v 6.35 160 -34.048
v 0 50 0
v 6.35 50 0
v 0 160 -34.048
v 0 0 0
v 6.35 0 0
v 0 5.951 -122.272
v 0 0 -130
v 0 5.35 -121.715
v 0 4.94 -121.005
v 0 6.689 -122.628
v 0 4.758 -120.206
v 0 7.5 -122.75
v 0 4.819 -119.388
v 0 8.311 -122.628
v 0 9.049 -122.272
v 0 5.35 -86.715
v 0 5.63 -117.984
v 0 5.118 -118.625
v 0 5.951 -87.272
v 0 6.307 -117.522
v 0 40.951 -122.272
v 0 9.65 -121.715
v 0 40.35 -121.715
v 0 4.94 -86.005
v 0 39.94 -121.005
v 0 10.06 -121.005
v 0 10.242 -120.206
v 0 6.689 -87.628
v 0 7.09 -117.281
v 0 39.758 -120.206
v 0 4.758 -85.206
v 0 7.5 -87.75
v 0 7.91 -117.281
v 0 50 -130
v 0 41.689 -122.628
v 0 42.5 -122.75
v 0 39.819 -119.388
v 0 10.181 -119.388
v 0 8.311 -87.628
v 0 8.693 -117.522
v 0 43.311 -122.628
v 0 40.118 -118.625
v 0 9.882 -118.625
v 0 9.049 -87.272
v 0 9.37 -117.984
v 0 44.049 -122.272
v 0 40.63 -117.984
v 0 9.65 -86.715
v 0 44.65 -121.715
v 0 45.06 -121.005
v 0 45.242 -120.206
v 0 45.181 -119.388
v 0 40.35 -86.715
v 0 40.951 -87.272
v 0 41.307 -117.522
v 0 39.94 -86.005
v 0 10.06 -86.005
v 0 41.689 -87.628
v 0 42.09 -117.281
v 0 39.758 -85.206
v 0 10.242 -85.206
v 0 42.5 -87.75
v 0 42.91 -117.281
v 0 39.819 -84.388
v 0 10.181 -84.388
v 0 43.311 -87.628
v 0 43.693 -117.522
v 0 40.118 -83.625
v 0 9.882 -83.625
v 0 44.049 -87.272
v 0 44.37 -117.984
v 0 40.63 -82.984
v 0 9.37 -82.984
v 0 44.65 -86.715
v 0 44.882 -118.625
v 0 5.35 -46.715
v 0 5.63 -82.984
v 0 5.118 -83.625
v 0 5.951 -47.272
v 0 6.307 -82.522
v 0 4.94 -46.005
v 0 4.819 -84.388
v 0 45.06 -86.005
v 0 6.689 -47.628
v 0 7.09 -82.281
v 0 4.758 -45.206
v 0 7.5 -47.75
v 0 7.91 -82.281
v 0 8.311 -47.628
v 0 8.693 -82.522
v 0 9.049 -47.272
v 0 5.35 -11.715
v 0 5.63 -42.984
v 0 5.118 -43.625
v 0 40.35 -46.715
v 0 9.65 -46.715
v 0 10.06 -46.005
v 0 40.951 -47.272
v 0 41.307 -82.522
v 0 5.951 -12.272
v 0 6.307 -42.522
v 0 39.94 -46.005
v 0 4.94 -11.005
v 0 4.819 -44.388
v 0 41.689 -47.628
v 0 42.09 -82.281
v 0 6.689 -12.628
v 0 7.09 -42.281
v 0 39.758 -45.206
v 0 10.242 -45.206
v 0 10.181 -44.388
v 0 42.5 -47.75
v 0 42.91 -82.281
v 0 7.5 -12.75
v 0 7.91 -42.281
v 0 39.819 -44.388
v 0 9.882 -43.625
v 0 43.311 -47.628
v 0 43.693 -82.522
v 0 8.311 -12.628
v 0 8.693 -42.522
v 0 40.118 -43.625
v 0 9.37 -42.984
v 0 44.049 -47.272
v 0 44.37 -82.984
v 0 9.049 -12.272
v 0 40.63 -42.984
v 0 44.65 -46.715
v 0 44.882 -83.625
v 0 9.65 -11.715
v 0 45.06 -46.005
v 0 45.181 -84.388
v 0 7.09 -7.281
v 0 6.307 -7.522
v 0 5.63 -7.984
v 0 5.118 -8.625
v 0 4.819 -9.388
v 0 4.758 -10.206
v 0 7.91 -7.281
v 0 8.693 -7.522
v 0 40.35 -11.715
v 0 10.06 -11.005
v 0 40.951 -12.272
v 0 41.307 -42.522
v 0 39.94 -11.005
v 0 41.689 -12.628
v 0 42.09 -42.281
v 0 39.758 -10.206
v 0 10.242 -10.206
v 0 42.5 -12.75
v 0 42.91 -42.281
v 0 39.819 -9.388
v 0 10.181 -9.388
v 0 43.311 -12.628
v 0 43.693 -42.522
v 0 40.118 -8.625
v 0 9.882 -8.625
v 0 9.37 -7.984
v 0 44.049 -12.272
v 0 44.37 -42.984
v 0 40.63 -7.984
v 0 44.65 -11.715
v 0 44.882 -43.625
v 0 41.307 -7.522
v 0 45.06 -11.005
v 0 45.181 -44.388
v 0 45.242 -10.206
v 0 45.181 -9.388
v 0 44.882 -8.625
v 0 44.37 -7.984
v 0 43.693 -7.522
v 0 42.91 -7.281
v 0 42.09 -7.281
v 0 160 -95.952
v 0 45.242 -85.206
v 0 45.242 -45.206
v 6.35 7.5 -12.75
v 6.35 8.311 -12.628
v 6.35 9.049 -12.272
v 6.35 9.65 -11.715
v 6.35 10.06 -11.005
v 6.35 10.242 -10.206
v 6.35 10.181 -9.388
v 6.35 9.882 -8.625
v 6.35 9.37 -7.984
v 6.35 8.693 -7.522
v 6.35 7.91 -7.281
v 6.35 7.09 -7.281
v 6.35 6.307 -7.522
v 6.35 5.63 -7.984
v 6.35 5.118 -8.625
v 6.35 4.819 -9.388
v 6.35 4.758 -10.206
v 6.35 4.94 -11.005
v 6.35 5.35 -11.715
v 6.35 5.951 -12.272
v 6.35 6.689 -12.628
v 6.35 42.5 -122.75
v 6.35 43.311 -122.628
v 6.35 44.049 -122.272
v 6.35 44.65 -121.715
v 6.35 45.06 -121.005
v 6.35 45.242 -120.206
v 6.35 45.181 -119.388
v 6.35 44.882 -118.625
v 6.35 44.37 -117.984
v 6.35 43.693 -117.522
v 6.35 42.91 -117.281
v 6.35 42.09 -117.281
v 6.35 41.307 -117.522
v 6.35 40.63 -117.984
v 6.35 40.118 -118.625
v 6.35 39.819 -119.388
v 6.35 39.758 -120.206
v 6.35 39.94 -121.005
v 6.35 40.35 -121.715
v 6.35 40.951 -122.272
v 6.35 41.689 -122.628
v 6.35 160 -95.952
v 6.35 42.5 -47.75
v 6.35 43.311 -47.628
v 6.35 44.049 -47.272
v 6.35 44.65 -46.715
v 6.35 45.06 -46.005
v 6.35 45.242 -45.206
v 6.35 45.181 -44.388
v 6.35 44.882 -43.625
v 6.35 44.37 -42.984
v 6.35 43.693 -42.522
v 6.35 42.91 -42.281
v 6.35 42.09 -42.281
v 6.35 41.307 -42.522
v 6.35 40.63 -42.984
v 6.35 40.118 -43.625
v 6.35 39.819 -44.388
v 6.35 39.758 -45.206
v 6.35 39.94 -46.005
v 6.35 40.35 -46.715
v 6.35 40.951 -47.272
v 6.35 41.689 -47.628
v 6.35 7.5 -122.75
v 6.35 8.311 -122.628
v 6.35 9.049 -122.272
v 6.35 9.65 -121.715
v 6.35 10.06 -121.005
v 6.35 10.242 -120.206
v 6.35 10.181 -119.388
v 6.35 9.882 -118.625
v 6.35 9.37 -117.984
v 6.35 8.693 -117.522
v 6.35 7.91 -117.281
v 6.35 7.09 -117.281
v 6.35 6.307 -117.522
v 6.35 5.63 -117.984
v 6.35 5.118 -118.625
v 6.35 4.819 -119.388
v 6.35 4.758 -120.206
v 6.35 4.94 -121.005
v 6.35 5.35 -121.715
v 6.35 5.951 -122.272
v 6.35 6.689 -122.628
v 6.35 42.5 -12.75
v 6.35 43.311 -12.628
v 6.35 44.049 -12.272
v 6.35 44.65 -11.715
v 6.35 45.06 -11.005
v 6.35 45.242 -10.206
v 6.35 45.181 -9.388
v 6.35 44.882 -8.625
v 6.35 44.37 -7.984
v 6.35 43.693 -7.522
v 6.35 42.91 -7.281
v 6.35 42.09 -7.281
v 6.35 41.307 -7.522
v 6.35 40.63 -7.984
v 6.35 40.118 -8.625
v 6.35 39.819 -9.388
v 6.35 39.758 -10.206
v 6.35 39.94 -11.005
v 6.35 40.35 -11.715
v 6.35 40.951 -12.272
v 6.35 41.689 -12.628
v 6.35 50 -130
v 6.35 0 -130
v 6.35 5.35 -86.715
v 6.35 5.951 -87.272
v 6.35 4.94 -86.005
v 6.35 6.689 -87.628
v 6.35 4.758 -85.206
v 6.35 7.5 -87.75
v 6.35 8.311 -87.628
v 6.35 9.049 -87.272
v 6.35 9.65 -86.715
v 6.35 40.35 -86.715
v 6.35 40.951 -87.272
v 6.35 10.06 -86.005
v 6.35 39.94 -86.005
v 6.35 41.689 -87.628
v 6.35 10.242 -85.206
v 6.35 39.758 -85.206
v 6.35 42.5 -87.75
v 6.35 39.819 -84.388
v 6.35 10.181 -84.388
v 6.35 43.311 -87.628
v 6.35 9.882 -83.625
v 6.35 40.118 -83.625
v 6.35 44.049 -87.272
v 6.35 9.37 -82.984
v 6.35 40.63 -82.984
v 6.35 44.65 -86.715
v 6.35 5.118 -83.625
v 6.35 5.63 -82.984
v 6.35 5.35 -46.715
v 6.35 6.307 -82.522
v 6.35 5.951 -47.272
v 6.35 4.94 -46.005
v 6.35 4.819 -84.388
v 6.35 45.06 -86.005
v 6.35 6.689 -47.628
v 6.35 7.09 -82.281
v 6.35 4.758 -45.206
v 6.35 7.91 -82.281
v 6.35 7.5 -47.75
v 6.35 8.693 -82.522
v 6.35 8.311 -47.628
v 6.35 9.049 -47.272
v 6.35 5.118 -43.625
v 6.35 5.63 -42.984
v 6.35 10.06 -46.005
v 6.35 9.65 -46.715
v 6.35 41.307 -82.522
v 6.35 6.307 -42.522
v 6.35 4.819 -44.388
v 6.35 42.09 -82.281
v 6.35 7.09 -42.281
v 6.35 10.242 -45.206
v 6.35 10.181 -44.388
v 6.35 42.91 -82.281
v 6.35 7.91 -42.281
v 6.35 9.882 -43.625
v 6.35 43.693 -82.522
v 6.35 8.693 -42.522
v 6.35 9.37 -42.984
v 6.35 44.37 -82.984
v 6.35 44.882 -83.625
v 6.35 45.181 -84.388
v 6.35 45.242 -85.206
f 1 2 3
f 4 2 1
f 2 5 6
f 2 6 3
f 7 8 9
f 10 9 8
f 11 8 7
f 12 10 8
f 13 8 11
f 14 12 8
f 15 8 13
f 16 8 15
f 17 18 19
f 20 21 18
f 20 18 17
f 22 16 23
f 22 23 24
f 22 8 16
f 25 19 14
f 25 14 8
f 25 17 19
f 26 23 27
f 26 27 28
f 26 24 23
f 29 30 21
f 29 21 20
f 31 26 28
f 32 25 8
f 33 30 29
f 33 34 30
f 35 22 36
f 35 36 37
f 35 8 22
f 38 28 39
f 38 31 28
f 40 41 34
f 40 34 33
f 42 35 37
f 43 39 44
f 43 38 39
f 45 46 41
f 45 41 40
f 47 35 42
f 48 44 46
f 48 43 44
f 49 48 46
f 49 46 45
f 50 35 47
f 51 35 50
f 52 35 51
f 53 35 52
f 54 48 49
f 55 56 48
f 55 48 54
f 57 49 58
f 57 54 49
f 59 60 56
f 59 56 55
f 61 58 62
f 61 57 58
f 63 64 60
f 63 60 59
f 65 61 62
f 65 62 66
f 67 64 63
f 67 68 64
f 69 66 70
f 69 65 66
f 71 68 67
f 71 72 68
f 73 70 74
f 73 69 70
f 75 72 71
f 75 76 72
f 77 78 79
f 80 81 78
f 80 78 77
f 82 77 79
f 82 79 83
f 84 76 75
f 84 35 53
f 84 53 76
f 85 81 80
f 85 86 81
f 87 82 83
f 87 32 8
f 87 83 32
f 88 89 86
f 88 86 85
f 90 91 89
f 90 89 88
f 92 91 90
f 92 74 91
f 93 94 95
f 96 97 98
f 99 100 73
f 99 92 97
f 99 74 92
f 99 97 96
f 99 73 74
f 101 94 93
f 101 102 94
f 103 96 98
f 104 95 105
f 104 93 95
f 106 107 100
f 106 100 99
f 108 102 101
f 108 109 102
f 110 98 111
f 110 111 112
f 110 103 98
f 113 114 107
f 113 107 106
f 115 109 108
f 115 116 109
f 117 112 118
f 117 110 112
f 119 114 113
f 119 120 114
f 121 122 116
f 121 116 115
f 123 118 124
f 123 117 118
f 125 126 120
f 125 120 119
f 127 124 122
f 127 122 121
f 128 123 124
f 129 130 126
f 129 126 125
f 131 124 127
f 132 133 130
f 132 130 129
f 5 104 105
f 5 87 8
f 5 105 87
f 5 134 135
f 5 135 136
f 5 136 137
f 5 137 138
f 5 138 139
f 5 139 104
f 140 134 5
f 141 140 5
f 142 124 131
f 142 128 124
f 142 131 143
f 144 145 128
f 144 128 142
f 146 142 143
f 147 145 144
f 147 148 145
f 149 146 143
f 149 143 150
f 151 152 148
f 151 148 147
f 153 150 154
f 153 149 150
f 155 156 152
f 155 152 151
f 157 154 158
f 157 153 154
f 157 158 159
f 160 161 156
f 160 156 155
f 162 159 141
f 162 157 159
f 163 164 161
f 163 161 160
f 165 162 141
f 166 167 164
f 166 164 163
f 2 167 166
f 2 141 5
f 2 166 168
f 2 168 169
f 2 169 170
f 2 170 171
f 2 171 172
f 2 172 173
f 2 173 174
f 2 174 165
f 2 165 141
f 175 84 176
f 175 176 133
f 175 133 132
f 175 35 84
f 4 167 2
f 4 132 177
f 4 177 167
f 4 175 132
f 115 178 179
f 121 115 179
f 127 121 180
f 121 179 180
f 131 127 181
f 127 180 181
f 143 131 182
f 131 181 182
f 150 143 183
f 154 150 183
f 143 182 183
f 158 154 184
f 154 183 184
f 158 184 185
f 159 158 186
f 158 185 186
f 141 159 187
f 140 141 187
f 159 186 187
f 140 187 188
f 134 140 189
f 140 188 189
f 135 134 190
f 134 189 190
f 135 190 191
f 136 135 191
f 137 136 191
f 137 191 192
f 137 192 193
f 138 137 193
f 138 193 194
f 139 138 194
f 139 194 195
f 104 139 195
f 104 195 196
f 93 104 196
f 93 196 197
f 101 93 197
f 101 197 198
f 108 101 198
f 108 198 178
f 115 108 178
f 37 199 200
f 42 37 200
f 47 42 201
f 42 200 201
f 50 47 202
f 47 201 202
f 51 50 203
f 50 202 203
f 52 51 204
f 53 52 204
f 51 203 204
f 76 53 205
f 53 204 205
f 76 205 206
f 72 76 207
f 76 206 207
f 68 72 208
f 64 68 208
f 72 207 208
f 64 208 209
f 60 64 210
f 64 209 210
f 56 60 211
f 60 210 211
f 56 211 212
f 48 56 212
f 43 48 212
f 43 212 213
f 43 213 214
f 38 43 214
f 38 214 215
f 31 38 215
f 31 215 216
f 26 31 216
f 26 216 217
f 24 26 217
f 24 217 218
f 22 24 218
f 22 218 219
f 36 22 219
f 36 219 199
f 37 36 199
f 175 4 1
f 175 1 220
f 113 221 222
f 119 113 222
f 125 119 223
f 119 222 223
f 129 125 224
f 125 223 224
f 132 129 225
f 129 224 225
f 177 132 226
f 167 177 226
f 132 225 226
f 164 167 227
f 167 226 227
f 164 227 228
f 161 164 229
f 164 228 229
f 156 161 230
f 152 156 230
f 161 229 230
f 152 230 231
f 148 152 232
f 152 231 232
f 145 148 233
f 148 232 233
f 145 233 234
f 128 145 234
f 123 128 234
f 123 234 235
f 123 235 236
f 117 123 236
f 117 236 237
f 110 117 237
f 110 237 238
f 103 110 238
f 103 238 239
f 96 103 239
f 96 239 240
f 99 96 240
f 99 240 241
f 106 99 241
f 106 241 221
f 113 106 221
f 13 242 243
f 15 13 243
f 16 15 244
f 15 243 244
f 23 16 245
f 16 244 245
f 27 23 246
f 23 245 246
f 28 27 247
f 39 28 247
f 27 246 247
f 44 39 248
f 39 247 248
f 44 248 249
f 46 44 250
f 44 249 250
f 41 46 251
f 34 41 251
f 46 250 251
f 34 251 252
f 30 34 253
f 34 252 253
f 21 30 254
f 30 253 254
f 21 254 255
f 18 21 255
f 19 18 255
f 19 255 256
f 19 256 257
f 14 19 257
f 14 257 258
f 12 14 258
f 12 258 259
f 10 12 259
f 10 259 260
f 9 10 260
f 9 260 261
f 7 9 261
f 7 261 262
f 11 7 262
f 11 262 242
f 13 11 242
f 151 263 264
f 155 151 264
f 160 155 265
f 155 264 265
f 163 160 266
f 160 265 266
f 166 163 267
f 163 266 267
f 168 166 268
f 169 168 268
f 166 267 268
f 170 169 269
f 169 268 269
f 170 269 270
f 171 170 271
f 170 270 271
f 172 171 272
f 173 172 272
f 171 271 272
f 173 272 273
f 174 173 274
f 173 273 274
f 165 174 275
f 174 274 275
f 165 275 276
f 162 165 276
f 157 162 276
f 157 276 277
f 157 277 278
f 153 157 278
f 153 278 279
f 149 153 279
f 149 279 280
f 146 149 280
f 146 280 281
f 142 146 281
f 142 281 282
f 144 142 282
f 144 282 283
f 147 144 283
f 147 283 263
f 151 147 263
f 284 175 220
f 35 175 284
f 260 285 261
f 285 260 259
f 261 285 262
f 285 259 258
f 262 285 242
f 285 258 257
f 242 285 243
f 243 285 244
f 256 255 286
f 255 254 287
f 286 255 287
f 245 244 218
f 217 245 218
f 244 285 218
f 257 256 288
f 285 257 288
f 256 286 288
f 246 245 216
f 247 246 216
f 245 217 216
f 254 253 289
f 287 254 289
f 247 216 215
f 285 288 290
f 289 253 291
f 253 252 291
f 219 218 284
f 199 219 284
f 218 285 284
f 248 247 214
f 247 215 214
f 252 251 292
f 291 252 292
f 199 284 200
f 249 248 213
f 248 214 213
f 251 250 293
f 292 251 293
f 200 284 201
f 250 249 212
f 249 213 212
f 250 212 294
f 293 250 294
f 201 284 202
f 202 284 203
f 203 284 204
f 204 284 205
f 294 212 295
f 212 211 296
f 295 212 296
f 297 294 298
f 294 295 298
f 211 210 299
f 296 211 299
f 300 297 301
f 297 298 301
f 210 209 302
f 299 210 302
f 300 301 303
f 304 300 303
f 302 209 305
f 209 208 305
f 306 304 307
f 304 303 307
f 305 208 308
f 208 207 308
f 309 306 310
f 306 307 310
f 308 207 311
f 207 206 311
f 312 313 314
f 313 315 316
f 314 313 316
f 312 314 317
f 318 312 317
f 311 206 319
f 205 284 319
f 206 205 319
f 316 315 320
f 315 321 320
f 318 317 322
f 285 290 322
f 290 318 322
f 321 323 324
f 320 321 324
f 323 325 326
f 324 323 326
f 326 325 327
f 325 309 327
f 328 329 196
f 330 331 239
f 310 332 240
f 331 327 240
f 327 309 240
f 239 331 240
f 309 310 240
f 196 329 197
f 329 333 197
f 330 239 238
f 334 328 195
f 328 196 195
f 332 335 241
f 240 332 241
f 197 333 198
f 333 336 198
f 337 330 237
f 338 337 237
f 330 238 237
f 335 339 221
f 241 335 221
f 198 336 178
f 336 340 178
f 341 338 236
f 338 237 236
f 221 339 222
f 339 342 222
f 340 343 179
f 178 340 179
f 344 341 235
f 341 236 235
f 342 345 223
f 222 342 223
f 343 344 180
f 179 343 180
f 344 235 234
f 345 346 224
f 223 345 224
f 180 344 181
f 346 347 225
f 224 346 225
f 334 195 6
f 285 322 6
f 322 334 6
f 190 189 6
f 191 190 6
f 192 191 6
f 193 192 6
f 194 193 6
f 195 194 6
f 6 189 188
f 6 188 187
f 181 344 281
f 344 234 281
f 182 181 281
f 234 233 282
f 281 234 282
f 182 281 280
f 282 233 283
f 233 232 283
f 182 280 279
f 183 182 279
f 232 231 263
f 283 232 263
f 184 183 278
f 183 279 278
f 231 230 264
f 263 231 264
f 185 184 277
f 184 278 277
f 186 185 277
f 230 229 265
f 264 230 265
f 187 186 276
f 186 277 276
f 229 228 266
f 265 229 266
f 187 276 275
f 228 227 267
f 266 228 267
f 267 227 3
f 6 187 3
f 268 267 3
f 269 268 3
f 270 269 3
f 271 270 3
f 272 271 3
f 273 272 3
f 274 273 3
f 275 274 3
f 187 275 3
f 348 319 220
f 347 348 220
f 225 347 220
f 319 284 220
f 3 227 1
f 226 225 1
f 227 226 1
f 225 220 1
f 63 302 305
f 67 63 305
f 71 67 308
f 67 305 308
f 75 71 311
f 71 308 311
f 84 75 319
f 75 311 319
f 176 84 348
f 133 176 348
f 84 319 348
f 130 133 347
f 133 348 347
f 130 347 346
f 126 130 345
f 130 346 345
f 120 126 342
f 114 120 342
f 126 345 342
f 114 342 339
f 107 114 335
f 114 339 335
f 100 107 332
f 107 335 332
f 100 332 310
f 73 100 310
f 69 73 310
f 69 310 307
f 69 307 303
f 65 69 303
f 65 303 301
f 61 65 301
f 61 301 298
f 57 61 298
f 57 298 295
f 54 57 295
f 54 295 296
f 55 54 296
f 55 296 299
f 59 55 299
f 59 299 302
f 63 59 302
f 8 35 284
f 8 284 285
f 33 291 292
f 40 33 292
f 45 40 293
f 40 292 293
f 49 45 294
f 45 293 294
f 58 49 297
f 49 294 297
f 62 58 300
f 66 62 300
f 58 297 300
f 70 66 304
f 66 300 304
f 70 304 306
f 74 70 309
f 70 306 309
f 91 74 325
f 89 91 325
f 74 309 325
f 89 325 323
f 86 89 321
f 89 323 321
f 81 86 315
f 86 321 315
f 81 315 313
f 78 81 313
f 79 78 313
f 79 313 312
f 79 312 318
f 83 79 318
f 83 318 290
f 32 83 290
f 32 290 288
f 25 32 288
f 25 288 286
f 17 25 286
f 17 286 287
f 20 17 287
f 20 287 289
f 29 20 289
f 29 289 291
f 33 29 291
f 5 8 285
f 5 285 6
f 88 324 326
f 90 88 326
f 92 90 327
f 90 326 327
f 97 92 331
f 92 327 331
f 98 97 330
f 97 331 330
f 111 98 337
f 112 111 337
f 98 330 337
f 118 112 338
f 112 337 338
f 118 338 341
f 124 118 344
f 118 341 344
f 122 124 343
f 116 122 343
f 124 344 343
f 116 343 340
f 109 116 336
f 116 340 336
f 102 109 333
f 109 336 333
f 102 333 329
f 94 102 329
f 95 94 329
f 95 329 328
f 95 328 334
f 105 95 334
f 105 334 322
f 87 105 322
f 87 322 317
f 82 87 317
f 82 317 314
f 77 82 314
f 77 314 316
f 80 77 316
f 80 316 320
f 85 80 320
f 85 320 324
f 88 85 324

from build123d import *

# Parameters (mm, degrees)
BOSS_EXTRUDE1_DEPTH = 6.35
SKETCH3_R           = 2.75
CUT_EXTRUDE1_DEPTH  = 7.35


with BuildPart() as part:
    # Sketch2 → Boss-Extrude1 (new body)
    with BuildSketch(Plane(origin=(0, 0, 0), x_dir=(0, 0, -1), z_dir=(1, 0, 0))):
        Polygon((34.047619048, 160), (95.952380952, 160), (130, 50), (130, 0), (0, 0), (0, 50), align=None)
    extrude(amount=BOSS_EXTRUDE1_DEPTH)

    # Sketch3 → Cut-Extrude1 (cut, through all)
    with BuildSketch(Plane(origin=(6.35, 0, 0), x_dir=(0, 0, -1), z_dir=(1, 0, 0))):
        with Locations((10, 42.5)):
            Circle(SKETCH3_R)
        with Locations((45, 42.5)):
            Circle(SKETCH3_R)
        with Locations((10, 7.5)):
            Circle(SKETCH3_R)
        with Locations((45, 7.5)):
            Circle(SKETCH3_R)
        with Locations((120, 7.5)):
            Circle(SKETCH3_R)
        with Locations((85, 7.5)):
            Circle(SKETCH3_R)
        with Locations((85, 42.5)):
            Circle(SKETCH3_R)
        with Locations((120, 42.5)):
            Circle(SKETCH3_R)
    extrude(amount=-CUT_EXTRUDE1_DEPTH, mode=Mode.SUBTRACT)


solid = part.part
